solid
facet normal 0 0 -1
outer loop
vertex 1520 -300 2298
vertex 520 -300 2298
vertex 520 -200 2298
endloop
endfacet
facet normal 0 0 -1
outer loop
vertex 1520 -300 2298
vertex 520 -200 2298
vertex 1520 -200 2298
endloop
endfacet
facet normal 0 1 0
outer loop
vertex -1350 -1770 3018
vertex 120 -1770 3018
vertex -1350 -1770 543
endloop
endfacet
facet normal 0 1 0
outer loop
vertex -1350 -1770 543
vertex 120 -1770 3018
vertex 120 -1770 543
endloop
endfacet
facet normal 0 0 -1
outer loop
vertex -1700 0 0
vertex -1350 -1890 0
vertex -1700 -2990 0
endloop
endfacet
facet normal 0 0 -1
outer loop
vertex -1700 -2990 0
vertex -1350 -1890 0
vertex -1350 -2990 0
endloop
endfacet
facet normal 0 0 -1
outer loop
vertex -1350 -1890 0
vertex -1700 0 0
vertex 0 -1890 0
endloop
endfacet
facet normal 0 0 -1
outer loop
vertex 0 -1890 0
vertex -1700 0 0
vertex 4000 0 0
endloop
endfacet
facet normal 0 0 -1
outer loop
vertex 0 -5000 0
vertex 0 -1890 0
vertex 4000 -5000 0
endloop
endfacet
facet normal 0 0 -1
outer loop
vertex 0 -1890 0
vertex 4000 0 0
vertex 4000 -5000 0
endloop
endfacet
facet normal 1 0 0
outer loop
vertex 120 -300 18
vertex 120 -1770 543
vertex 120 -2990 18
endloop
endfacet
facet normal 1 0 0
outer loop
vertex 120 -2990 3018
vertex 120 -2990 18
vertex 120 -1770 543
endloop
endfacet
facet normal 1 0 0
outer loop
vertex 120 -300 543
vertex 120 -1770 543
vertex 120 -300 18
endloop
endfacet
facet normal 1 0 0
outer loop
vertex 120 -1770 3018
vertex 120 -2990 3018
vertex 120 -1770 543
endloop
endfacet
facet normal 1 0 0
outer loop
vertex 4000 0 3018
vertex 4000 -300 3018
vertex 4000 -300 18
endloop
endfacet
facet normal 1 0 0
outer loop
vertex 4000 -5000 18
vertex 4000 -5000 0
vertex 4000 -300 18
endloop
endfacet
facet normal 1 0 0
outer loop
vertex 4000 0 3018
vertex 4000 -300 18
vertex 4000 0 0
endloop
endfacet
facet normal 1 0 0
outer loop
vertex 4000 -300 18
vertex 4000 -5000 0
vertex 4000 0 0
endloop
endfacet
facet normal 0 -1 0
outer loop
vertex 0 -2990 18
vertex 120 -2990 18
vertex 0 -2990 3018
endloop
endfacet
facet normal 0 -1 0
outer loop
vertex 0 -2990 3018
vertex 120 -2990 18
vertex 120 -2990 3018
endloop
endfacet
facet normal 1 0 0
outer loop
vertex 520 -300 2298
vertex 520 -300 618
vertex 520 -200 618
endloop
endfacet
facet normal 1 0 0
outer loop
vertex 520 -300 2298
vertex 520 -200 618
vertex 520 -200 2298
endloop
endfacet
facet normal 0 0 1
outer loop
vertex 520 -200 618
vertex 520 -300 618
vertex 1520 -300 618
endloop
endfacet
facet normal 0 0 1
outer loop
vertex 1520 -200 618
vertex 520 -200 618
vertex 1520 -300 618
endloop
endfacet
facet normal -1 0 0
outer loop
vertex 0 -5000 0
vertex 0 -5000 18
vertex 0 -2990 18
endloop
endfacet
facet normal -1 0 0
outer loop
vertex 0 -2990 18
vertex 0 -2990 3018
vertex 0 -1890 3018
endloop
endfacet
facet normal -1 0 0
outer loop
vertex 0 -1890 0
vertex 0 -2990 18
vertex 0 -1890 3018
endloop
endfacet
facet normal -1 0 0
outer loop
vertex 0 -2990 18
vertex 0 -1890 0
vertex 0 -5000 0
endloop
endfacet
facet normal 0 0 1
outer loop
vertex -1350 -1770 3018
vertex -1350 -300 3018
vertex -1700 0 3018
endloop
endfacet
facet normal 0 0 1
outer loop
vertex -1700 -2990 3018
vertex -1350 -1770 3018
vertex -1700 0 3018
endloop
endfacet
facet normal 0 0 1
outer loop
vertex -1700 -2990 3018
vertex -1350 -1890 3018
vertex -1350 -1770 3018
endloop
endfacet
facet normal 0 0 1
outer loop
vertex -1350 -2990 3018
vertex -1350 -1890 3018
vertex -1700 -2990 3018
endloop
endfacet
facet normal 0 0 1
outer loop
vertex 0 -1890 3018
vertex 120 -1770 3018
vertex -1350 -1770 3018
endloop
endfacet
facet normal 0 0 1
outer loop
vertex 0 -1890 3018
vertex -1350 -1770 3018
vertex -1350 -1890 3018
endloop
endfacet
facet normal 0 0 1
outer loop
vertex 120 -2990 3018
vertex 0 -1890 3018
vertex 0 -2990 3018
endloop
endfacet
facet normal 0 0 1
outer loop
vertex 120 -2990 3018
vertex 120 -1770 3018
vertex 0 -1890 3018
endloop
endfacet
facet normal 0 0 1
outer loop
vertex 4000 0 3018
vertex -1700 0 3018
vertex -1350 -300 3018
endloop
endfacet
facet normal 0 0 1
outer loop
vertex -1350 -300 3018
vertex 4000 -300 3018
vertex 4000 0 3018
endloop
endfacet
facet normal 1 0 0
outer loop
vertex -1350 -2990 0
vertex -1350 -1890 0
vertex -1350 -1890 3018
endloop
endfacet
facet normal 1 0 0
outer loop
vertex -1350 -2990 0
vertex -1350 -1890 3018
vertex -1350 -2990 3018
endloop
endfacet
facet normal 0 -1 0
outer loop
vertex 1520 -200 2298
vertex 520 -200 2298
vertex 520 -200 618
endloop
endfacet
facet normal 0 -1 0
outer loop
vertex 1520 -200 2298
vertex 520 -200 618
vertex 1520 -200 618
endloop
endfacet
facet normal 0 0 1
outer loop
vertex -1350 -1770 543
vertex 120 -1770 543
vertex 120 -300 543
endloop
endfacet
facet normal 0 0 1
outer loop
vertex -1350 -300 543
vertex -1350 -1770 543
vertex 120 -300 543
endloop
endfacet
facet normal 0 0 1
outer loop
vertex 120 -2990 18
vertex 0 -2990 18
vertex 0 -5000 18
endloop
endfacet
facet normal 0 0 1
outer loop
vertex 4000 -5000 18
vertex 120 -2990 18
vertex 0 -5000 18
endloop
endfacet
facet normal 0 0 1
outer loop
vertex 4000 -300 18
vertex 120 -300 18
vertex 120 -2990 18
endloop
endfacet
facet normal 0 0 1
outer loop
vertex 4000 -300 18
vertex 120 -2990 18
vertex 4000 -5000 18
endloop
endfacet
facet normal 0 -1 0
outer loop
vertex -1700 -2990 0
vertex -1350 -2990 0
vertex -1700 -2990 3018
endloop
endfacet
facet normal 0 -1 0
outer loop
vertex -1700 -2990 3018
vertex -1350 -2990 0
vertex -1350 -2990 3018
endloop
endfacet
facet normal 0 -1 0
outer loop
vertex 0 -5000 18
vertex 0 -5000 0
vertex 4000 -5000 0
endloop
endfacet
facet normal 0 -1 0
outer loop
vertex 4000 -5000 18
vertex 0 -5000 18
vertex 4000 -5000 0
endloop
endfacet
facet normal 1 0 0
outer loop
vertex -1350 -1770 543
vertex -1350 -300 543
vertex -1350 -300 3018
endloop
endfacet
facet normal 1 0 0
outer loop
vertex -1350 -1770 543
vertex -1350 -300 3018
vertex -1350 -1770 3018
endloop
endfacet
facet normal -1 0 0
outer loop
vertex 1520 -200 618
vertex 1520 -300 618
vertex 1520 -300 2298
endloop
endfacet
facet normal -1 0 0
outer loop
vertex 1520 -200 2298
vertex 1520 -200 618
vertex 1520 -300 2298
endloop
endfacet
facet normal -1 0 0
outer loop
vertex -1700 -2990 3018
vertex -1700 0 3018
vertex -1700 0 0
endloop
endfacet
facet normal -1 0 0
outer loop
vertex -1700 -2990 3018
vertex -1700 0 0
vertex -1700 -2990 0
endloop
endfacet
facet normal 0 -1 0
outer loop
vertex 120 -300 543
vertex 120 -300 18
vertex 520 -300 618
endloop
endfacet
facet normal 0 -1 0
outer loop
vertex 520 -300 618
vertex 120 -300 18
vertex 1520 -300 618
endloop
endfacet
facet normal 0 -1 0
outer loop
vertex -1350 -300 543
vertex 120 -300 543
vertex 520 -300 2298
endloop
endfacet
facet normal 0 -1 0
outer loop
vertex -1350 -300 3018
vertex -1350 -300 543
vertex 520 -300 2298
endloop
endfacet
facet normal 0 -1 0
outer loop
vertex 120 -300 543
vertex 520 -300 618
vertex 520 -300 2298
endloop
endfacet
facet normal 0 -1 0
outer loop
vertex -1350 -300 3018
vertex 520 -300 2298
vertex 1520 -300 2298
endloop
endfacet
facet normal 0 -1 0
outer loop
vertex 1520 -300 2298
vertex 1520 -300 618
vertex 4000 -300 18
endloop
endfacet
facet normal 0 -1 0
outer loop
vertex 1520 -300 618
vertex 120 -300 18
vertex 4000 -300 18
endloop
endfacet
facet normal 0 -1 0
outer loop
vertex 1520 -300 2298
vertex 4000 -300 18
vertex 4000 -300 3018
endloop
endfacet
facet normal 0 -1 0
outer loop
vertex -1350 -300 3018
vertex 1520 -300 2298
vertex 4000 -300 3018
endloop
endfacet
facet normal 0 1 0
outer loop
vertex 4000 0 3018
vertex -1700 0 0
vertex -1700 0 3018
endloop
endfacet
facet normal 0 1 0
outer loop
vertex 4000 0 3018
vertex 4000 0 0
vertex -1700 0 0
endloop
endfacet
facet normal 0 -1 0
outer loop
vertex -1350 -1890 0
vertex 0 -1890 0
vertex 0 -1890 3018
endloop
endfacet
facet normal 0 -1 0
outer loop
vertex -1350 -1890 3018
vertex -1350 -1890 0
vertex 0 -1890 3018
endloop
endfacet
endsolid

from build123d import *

# Parameters (mm, degrees)
F0_W      = 4000
F0_H      = 5000
F1_DEPTH  = 18
F2_W      = 4000
F2_H      = 300
F3_DEPTH  = 3000
F4_W      = 120
F4_H      = 2690
F5_DEPTH  = 525
F6_W      = 1220
F6_H      = 2475
F7_DEPTH  = 120
F9_DEPTH  = 1350
F10_W     = 2990
F10_H     = 3018
F11_DEPTH = 350
F12_W     = 1000
F12_H     = 1680
F13_DEPTH = 100


with BuildPart() as f1:
    # F0 (on Top) → F1 (new body)
    with BuildSketch(Plane.XY):
        with Locations((2000, -2500)):
            Rectangle(F0_W, F0_H)
    extrude(amount=F1_DEPTH)

    # F2 (on face) → F3 (join)
    with BuildSketch(Plane.XY.offset(18)):
        with Locations((2000, -150)):
            Rectangle(F2_W, F2_H)
    extrude(amount=F3_DEPTH)

    # F4 (on face) → F5 (join)
    with BuildSketch(Plane.XY.offset(18)):
        with Locations((60, -1645)):
            Rectangle(F4_W, F4_H)
    extrude(amount=F5_DEPTH)

    # F6 (on face) → F7 (join, through all)
    with BuildSketch(Plane.YZ.offset(120)):
        with Locations((-2380, 1780.5)):
            Rectangle(F6_W, F6_H)
    extrude(amount=-F7_DEPTH)

    # F8 (on face) → F9 (join)
    with BuildSketch(Plane(origin=(0, 0, 0), x_dir=(0, -1, 0), z_dir=(-1, 0, 0))):
        Polygon((300, 3018), (0, 3018), (0, 0), (1890, 0), (1890, 3018), (1770, 3018), (1770, 543), (300, 543), align=None)
    extrude(amount=F9_DEPTH)

    # F10 (on face) → F11 (join)
    with BuildSketch(Plane(origin=(-1350, 0, 0), x_dir=(0, -1, 0), z_dir=(-1, 0, 0))):
        with Locations((1495, 1509)):
            Rectangle(F10_W, F10_H)
    extrude(amount=F11_DEPTH)

    # F12 (on face) → F13 (cut)
    with BuildSketch(Plane.XZ.offset(300)):
        with Locations((1020, 1458)):
            Rectangle(F12_W, F12_H)
    extrude(amount=-F13_DEPTH, mode=Mode.SUBTRACT)


solid = f1.part
